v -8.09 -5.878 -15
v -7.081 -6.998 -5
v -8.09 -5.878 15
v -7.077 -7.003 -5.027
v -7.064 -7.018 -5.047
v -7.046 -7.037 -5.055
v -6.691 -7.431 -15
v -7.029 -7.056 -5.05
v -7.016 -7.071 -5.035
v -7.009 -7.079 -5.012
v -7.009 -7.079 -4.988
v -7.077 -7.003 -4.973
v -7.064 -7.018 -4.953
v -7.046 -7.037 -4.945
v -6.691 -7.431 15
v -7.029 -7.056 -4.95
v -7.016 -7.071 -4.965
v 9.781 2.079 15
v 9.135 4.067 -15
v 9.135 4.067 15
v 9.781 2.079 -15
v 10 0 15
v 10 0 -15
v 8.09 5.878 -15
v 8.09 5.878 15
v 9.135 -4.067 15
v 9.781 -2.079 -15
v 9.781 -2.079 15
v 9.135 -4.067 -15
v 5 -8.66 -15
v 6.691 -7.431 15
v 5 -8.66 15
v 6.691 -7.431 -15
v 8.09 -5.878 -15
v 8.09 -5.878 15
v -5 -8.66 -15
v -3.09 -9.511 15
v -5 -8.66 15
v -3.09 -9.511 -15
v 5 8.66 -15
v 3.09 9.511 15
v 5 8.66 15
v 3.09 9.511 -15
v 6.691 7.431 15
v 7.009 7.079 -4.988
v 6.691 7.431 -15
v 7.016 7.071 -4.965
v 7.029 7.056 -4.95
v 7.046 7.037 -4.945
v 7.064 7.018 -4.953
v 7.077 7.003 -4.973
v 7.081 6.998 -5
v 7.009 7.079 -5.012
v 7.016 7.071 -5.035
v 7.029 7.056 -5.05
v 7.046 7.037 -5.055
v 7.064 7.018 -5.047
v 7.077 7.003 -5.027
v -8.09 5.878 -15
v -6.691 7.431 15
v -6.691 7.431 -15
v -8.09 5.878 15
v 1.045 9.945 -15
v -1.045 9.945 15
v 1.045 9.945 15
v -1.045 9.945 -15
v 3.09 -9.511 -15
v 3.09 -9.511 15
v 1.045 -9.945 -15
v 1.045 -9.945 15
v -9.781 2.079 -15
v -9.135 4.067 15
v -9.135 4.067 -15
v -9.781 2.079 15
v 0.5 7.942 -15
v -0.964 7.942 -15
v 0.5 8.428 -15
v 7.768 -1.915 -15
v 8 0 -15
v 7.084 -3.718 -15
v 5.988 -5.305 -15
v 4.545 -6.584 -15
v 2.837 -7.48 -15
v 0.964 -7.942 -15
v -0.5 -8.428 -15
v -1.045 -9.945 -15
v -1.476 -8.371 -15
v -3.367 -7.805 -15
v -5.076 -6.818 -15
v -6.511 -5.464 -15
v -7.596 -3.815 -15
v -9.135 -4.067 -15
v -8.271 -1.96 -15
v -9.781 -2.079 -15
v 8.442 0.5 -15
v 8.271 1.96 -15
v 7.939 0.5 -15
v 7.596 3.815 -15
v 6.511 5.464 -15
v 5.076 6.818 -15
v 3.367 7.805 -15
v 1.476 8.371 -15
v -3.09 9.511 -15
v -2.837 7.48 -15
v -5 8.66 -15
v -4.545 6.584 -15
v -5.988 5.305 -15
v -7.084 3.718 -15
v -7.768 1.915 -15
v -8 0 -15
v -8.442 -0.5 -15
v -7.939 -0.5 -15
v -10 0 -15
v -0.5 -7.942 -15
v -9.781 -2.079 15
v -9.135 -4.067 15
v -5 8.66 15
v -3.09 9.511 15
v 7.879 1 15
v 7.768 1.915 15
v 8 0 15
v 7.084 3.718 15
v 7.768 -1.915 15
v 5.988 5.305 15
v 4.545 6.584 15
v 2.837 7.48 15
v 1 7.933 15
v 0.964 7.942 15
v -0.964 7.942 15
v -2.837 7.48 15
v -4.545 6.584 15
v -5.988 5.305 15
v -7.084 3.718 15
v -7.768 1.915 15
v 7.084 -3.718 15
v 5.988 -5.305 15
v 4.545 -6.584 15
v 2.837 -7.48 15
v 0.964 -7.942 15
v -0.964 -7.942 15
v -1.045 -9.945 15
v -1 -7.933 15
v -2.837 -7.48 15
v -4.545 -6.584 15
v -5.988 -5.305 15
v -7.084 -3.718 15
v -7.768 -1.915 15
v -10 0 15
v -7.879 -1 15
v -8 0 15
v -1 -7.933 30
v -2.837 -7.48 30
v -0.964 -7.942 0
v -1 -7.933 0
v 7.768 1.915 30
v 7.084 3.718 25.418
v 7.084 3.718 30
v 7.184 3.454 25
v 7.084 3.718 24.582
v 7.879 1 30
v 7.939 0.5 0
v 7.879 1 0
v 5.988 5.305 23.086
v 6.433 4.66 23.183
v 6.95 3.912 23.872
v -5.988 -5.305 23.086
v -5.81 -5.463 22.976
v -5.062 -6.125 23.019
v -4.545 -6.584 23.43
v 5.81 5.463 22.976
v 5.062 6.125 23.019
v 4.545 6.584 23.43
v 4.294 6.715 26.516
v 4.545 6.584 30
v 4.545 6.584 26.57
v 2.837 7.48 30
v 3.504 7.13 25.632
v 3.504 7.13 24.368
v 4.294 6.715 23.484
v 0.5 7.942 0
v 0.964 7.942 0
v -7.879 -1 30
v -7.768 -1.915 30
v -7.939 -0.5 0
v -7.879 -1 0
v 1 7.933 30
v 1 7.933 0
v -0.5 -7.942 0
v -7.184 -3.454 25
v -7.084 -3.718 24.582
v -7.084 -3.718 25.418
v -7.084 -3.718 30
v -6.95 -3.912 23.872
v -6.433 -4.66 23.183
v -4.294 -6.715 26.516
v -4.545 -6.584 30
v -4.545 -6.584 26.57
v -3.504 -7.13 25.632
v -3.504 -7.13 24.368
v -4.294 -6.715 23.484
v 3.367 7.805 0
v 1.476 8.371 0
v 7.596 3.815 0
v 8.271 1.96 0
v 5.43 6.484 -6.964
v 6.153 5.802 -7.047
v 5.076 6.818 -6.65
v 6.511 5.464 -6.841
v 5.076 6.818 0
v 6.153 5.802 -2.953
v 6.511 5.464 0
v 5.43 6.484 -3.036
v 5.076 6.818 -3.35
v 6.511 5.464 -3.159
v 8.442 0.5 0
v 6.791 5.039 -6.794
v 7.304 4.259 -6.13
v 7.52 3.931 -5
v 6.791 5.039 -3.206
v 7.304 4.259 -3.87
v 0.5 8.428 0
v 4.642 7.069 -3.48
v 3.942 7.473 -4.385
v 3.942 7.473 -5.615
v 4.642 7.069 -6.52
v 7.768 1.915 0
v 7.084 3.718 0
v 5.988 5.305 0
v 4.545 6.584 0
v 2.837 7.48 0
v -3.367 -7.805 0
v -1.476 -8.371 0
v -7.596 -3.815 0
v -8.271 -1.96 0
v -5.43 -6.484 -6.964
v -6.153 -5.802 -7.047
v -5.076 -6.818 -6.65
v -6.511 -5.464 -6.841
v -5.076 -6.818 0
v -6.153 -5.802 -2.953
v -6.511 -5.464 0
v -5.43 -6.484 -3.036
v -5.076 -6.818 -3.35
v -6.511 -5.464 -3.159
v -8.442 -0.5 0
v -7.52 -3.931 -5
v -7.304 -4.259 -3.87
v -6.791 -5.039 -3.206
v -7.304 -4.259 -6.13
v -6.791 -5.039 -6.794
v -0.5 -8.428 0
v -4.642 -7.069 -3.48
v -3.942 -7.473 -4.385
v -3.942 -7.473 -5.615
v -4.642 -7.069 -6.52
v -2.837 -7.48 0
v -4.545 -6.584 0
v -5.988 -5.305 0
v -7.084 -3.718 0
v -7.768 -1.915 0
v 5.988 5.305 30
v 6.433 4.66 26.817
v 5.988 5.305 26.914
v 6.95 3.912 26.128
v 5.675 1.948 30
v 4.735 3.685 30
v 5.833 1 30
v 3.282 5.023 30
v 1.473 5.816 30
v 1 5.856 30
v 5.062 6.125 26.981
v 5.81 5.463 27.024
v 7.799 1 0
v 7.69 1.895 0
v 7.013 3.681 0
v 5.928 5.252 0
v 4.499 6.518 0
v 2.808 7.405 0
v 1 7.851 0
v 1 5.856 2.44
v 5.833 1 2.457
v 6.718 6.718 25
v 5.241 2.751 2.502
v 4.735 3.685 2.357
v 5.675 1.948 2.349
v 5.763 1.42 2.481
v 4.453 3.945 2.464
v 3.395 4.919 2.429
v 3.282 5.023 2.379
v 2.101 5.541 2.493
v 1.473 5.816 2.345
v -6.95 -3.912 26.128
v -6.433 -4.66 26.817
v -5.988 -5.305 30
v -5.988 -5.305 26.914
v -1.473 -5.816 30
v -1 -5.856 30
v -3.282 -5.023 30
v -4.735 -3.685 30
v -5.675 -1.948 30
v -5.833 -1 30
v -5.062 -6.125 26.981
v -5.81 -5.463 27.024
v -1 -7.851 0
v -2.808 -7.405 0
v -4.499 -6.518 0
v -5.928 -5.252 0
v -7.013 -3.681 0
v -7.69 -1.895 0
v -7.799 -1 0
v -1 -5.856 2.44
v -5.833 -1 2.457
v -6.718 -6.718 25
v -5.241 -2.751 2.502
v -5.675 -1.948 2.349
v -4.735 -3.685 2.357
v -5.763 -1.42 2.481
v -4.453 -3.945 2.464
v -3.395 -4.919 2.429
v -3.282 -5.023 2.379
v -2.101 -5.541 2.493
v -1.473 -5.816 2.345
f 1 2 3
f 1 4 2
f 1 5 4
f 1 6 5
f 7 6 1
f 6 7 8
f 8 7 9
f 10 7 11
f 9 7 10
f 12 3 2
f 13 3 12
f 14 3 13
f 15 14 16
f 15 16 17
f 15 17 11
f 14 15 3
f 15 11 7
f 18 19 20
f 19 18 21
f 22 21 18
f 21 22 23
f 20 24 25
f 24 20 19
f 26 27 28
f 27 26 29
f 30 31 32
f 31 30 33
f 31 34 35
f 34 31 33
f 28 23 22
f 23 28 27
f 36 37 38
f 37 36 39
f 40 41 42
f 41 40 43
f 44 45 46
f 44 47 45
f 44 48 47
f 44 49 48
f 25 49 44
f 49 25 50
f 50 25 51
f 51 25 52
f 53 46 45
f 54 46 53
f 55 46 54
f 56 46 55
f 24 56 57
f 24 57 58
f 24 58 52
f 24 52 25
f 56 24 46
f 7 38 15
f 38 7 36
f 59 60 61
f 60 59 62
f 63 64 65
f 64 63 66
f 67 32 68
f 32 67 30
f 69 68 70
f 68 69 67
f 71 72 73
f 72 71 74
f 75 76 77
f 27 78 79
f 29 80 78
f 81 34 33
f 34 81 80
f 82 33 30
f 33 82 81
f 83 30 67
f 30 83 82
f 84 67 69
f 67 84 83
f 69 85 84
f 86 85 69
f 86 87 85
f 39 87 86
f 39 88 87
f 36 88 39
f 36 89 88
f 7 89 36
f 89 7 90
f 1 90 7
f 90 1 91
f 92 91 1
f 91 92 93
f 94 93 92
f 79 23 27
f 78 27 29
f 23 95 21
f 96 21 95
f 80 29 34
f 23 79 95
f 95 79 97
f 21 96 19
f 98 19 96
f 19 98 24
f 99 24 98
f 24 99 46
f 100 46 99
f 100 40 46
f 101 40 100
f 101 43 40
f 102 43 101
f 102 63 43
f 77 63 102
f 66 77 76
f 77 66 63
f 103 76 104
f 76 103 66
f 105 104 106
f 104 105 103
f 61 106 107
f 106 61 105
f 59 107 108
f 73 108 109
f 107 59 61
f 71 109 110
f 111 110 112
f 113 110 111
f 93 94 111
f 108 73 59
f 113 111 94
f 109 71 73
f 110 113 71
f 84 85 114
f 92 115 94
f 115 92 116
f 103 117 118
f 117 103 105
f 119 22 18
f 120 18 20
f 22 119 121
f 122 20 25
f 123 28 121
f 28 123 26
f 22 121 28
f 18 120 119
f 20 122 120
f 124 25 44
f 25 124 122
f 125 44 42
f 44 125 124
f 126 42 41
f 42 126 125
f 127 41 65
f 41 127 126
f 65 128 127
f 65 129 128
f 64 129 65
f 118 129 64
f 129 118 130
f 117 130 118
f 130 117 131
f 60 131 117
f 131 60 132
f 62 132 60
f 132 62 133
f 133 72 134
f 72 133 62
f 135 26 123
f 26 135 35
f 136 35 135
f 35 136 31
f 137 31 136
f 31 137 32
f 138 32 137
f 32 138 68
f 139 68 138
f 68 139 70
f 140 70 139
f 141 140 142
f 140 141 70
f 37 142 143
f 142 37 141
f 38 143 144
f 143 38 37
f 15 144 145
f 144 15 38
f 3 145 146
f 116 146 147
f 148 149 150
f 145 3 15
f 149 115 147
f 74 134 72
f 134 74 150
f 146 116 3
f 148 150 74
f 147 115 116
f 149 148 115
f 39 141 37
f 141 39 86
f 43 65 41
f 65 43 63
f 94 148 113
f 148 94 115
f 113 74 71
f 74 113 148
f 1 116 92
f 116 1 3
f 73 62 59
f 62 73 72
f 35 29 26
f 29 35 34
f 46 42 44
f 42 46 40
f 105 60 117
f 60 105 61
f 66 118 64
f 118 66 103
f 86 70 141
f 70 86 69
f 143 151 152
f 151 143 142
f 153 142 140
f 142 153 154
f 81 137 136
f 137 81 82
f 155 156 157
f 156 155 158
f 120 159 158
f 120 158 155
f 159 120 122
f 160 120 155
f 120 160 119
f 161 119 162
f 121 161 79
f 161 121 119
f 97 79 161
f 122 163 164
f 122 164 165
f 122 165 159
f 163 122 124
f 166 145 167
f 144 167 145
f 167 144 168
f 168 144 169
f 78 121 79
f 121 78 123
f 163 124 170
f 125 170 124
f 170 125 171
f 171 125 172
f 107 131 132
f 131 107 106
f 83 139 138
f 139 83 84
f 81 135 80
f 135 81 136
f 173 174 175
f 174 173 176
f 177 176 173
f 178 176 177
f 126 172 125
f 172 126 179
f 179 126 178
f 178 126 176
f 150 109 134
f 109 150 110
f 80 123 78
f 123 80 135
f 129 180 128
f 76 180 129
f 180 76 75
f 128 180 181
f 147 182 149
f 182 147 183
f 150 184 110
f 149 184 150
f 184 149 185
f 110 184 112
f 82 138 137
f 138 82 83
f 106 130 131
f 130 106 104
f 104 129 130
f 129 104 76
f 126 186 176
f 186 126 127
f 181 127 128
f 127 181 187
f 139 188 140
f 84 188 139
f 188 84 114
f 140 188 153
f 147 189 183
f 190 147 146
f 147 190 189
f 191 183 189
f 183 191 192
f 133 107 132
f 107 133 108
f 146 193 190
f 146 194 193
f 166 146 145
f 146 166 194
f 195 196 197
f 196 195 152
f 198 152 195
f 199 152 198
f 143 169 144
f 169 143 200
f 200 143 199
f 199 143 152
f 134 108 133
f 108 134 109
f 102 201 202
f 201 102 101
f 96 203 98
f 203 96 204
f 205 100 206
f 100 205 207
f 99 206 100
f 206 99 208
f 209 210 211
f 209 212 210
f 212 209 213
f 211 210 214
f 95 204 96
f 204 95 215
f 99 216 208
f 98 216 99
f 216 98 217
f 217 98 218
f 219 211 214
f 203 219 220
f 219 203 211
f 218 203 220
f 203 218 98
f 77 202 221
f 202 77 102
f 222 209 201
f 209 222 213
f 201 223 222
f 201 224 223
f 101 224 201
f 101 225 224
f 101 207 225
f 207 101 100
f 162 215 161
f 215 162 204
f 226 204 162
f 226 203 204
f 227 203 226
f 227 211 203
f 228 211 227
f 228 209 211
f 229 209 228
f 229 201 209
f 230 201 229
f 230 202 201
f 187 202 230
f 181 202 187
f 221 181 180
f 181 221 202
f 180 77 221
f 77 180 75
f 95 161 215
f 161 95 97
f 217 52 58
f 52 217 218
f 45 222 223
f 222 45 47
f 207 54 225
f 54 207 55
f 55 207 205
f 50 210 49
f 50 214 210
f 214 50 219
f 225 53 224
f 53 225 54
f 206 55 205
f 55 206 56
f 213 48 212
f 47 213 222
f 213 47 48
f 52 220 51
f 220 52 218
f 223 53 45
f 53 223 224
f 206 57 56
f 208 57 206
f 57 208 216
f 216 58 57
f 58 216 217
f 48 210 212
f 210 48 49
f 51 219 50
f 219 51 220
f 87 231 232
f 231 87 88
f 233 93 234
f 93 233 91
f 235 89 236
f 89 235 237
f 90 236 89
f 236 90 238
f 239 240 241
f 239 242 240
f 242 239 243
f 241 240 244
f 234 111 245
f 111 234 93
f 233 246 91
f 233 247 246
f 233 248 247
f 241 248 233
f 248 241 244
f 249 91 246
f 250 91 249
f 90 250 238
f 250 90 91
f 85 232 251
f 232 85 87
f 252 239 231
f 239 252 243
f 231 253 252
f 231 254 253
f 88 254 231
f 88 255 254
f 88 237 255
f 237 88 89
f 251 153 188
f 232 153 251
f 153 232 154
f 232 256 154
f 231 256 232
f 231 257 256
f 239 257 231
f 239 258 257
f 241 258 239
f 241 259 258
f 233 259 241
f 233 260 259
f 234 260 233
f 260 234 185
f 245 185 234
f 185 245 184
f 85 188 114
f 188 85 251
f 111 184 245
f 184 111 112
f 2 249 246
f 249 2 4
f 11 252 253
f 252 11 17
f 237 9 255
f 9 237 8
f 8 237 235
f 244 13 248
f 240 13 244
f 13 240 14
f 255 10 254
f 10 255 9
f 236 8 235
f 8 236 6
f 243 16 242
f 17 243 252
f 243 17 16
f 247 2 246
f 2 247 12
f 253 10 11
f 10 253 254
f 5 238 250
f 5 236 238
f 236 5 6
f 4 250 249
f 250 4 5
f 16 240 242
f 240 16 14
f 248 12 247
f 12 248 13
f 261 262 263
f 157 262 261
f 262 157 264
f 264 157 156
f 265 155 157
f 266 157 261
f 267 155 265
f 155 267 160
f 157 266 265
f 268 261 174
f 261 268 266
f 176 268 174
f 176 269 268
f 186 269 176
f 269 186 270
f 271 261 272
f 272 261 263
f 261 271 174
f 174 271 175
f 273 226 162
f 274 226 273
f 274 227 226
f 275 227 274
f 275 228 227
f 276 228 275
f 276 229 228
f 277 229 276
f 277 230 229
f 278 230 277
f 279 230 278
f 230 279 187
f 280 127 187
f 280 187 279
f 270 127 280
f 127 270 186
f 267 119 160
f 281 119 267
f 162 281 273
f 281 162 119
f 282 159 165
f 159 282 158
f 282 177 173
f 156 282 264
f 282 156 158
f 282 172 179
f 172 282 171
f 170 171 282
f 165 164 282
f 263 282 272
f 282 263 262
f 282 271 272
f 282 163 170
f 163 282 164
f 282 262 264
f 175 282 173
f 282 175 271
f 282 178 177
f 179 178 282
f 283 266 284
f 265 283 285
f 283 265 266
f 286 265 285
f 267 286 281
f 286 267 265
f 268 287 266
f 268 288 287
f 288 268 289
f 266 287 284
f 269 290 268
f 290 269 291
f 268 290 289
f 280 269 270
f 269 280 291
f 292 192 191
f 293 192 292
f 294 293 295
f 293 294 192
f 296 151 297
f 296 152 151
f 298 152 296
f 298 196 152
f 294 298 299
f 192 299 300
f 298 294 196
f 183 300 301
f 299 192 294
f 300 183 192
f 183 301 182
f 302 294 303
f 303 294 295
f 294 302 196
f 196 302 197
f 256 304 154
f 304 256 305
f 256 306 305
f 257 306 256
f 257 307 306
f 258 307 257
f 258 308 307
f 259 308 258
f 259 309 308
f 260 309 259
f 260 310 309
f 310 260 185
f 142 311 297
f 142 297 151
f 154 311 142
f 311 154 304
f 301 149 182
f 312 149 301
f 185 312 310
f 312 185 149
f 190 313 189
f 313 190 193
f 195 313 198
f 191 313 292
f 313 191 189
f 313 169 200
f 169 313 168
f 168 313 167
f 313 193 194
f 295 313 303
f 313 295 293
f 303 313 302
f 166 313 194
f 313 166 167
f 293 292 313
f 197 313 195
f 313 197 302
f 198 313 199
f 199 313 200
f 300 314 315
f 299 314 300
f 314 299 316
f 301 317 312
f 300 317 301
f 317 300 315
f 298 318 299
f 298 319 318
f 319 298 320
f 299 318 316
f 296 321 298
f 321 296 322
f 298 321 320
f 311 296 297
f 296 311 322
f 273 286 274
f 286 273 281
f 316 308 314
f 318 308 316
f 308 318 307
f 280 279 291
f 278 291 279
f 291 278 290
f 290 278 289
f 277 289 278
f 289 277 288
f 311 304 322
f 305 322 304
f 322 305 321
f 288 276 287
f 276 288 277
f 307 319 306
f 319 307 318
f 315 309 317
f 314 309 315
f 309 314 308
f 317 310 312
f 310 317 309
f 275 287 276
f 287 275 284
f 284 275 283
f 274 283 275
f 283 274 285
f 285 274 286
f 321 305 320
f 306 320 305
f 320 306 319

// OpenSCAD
difference() {
	union() {
		difference() {
			difference() {
				cylinder(h = 30, r = 10, center = true);
				cylinder(h = 31, r = 8, center = true);
			}
			translate(v = [0, 0, -15]) {
				union() {
					rotate(a = -45, v = [0, 0, 1]) {
						translate(v = [0, 7, 10]) {
							rotate(a = -90, v = [1, 0, 0]) {
								cylinder(r1 = 4, r2 = 0, h = 3);
							}
						}
					}
					difference() {
						intersection() {
							cylinder(h = 30, r = 8.5000000000, center = true);
							translate(v = [0.5000000000, 0.5000000000, -50]) {
								cube(size = [100, 100, 100]);
							}
						}
						cylinder(h = 31, r = 6, center = true);
					}
				}
			}
			rotate(a = 180, v = [0, 0, 1]) {
				translate(v = [0, 0, -15]) {
					union() {
						rotate(a = -45, v = [0, 0, 1]) {
							translate(v = [0, 7, 10]) {
								rotate(a = -90, v = [1, 0, 0]) {
									cylinder(r1 = 4, r2 = 0, h = 3);
								}
							}
						}
						difference() {
							intersection() {
								cylinder(h = 30, r = 8.5000000000, center = true);
								translate(v = [0.5000000000, 0.5000000000, -50]) {
									cube(size = [100, 100, 100]);
								}
							}
							cylinder(h = 31, r = 6, center = true);
						}
					}
				}
			}
		}
		translate(v = [0, 0, 15]) {
			difference() {
				union() {
					rotate(a = -45, v = [0, 0, 1]) {
						translate(v = [0, 6.5000000000, 10]) {
							rotate(a = -90, v = [1, 0, 0]) {
								cylinder(r1 = 4, r2 = 0, h = 3);
							}
						}
					}
					intersection() {
						cylinder(h = 30, r = 8, center = true);
						translate(v = [1, 1, -50]) {
							cube(size = [100, 100, 100]);
						}
					}
				}
				cylinder(h = 31, r = 6, center = true);
			}
		}
		rotate(a = 180, v = [0, 0, 1]) {
			translate(v = [0, 0, 15]) {
				difference() {
					union() {
						rotate(a = -45, v = [0, 0, 1]) {
							translate(v = [0, 6.5000000000, 10]) {
								rotate(a = -90, v = [1, 0, 0]) {
									cylinder(r1 = 4, r2 = 0, h = 3);
								}
							}
						}
						intersection() {
							cylinder(h = 30, r = 8, center = true);
							translate(v = [1, 1, -50]) {
								cube(size = [100, 100, 100]);
							}
						}
					}
					cylinder(h = 31, r = 6, center = true);
				}
			}
		}
	}
	union() {
		translate(v = [0, 0, 4.9000000000]) {
			cylinder(r1 = 8, r2 = 0, h = 10, center = true);
		}
	}
}
